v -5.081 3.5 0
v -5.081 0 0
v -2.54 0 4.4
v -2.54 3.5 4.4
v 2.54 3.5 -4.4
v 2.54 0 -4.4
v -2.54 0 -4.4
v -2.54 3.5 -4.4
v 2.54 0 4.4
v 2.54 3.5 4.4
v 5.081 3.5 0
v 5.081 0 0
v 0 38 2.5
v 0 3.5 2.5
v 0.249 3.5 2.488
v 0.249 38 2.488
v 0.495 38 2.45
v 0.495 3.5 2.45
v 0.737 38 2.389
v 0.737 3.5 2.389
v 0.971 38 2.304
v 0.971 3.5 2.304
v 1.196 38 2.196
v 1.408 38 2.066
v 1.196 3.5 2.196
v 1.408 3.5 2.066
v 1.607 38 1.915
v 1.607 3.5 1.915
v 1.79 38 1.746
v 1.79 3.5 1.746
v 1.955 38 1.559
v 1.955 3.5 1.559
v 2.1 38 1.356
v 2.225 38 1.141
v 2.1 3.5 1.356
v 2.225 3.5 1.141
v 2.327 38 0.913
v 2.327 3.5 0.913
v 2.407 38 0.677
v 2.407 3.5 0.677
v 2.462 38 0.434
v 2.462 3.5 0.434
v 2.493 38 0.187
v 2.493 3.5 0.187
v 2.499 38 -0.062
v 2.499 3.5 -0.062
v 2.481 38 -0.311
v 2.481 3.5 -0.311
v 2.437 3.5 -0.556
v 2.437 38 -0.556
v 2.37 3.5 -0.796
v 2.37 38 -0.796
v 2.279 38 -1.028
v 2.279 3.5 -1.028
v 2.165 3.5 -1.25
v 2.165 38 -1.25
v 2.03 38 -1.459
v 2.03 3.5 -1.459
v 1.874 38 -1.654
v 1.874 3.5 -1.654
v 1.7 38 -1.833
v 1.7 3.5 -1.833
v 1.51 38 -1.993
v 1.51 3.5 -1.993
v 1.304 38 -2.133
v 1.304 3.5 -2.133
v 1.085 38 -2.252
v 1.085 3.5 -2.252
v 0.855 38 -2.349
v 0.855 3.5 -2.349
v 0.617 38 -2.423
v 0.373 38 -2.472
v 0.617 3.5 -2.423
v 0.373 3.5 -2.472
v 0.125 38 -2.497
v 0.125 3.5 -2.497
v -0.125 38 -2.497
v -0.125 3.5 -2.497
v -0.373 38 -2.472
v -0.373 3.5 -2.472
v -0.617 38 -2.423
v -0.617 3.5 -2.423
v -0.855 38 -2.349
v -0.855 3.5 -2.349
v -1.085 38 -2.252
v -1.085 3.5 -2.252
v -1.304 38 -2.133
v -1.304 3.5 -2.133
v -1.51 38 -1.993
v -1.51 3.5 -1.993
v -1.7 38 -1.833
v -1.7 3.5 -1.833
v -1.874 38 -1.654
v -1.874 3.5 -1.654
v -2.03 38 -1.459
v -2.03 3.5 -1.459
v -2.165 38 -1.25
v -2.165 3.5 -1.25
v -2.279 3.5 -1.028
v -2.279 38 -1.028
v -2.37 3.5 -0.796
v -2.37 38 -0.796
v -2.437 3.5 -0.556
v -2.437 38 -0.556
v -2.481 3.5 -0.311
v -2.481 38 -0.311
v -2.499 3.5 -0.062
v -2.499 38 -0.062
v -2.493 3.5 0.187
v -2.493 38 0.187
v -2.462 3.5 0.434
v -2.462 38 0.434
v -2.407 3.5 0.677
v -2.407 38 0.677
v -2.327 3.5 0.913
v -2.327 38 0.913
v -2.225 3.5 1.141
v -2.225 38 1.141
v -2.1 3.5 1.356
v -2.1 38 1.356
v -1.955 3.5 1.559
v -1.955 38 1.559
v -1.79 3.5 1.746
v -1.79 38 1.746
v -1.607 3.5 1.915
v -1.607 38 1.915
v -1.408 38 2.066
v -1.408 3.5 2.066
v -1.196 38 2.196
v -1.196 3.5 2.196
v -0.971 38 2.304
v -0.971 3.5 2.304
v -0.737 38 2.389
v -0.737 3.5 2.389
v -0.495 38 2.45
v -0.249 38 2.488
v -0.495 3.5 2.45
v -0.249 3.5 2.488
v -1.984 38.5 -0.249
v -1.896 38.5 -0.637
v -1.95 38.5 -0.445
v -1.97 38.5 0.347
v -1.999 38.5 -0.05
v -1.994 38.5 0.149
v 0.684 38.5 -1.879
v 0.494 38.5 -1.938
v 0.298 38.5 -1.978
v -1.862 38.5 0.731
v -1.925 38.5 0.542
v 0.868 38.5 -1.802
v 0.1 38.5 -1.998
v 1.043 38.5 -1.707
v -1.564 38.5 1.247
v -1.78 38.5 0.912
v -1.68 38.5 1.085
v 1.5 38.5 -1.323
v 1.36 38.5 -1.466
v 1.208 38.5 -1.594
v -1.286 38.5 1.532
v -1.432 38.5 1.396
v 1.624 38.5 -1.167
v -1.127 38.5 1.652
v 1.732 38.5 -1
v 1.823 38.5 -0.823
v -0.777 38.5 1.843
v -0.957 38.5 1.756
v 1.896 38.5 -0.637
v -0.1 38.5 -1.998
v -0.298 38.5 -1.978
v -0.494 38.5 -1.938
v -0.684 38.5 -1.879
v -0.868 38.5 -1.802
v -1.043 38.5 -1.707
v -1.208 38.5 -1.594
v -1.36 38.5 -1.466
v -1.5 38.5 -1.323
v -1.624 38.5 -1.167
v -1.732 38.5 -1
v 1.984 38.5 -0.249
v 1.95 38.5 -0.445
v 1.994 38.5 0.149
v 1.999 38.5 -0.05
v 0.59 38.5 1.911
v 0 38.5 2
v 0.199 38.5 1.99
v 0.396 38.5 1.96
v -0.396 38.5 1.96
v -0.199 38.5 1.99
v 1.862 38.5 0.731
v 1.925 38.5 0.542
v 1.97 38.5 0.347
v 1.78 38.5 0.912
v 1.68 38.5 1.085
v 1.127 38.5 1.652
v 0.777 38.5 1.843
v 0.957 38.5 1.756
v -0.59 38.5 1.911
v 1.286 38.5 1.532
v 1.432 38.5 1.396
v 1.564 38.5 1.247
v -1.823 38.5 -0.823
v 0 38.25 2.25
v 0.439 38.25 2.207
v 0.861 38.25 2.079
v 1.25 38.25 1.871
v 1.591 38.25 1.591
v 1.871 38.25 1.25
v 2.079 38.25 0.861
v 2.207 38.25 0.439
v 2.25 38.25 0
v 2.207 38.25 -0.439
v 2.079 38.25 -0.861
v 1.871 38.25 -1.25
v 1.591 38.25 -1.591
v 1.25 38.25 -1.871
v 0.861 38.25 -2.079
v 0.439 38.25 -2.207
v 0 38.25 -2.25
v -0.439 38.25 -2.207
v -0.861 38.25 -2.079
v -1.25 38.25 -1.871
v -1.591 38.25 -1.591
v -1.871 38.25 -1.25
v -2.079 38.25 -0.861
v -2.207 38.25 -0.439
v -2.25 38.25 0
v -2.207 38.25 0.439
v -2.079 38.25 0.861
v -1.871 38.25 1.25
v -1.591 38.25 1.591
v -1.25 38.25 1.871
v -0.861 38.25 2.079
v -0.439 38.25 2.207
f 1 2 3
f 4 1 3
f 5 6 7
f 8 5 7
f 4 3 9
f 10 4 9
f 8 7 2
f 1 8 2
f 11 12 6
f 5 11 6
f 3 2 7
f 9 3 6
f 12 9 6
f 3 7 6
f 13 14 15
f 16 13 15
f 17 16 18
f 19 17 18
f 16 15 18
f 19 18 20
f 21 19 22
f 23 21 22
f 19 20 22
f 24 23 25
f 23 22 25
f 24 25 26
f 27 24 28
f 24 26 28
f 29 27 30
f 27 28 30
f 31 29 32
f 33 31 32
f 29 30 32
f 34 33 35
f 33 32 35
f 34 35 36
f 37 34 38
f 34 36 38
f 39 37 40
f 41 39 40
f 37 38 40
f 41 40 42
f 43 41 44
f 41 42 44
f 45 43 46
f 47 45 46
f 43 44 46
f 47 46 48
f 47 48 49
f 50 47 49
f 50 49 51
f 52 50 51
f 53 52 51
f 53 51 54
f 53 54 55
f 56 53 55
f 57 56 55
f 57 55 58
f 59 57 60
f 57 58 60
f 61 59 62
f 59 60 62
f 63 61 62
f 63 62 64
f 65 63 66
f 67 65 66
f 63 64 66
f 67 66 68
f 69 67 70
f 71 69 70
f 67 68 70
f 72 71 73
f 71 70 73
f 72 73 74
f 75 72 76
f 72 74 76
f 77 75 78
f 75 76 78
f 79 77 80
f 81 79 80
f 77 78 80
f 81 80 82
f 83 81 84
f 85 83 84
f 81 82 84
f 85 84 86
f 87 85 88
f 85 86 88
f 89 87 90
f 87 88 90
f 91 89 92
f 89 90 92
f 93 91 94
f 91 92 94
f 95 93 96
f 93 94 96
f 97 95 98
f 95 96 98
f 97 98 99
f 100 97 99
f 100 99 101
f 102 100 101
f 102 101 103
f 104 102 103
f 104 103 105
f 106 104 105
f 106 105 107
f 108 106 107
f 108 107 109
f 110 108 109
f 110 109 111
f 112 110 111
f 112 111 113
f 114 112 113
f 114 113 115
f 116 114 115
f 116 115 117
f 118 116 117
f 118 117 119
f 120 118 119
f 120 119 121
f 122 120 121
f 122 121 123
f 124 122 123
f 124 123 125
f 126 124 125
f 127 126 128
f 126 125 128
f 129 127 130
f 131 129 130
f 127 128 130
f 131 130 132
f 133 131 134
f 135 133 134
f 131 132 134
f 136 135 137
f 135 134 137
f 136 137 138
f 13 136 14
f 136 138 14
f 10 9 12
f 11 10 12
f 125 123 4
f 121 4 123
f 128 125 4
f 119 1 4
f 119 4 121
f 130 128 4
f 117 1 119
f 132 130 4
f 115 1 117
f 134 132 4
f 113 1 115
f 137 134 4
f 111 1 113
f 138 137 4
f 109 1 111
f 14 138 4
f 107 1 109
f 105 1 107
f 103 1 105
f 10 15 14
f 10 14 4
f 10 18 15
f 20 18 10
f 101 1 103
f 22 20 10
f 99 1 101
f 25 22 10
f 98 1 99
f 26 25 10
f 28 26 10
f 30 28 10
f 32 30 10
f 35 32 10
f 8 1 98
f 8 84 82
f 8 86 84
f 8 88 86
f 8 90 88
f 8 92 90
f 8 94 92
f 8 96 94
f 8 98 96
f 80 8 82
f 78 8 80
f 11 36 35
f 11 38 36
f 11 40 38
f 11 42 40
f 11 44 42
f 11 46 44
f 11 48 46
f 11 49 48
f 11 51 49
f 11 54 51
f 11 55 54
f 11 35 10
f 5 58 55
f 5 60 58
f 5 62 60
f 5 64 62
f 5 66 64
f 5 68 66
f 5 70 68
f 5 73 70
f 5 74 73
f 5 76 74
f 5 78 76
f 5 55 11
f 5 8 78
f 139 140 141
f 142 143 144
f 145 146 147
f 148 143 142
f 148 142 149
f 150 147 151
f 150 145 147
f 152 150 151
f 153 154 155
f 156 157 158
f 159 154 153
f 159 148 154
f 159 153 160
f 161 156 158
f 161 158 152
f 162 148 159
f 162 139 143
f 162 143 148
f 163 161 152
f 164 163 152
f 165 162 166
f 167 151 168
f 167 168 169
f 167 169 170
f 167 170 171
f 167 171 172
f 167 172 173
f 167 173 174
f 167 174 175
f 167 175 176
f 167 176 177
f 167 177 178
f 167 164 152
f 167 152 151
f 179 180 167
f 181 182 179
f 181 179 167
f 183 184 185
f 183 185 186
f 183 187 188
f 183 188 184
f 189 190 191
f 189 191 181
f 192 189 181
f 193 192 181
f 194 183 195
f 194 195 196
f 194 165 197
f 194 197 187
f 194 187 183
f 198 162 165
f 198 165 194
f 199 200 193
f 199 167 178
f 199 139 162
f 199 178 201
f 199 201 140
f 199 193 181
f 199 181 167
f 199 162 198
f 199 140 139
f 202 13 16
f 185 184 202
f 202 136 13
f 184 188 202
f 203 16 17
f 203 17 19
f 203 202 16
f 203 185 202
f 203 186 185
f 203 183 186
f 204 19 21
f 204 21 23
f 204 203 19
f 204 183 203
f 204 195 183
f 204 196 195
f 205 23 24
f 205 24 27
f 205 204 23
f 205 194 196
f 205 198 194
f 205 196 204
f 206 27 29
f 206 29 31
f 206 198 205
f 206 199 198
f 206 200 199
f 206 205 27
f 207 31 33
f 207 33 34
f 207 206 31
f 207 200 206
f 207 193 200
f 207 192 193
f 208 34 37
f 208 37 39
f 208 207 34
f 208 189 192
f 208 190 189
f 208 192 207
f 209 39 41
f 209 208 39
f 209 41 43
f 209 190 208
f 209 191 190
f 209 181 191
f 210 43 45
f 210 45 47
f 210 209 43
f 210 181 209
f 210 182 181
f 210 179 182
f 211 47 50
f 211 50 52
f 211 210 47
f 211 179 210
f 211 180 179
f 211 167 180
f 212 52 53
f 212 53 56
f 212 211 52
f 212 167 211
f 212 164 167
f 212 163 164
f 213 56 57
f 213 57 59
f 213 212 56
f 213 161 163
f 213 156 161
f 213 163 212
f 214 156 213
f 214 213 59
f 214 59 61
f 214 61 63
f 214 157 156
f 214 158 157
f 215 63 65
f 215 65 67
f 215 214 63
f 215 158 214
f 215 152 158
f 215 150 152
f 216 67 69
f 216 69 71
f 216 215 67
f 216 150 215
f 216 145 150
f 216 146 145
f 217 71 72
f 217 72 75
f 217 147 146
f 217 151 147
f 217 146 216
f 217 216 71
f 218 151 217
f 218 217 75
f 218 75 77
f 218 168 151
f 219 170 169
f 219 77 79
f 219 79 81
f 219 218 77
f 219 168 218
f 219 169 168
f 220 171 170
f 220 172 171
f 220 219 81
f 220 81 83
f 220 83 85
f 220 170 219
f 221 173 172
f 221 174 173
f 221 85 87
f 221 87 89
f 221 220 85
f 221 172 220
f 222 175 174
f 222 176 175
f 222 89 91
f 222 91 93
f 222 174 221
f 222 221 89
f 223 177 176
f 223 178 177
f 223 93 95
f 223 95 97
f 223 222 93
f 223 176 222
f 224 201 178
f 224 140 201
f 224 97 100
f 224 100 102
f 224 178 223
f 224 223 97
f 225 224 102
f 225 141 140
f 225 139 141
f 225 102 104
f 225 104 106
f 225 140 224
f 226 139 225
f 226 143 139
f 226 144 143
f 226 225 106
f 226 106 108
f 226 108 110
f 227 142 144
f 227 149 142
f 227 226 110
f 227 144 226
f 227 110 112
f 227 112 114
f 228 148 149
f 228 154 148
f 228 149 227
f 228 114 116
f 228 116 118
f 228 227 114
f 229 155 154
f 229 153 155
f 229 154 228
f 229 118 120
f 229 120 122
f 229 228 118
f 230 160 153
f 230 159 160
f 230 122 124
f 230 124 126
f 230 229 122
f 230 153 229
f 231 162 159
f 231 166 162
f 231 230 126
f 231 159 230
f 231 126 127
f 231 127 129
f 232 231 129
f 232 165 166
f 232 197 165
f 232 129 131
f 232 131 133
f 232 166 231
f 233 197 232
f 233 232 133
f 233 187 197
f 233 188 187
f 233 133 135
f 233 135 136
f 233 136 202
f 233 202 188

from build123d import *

# Parameters (mm, degrees)
SKETCH1_R           = 2.5
BOSS_EXTRUDE1_DEPTH = 3.5
BOSS_EXTRUDE2_START = 3.5
SKETCH1_3_R         = 2.5
BOSS_EXTRUDE2_DEPTH = 35
CHAMFER1_SIZE       = 0.5


with BuildPart() as part:
    # Sketch1 → Boss-Extrude1 (new body)
    with BuildSketch(Plane(origin=(0, 0, 0), x_dir=(1, 0, 0), z_dir=(0, 1, 0))):
        Polygon((-5.080682369, 0), (-2.540341184, -4.4), (2.540341184, -4.4), (5.080682369, 0), (2.540341184, 4.4), (-2.540341184, 4.4), align=None)
        Circle(SKETCH1_R, mode=Mode.SUBTRACT)
        Circle(SKETCH1_R)
    extrude(amount=BOSS_EXTRUDE1_DEPTH)

    # Sketch1<3> → Boss-Extrude2 (add)
    with BuildSketch(Plane(origin=(0, 0, 0), x_dir=(1, 0, 0), z_dir=(0, 1, 0)).offset(BOSS_EXTRUDE2_START)):
        with Locations(Location((0, 0, 0), (0, 0, 270))):
            Circle(SKETCH1_3_R)
    extrude(amount=BOSS_EXTRUDE2_DEPTH)

    # Chamfer1
    chamfer1_edges = [part.edges().sort_by_distance(p)[0] for p in [
        (0, 38.5, -2.5),
    ]]
    chamfer(chamfer1_edges, length=CHAMFER1_SIZE)


solid = part.part
